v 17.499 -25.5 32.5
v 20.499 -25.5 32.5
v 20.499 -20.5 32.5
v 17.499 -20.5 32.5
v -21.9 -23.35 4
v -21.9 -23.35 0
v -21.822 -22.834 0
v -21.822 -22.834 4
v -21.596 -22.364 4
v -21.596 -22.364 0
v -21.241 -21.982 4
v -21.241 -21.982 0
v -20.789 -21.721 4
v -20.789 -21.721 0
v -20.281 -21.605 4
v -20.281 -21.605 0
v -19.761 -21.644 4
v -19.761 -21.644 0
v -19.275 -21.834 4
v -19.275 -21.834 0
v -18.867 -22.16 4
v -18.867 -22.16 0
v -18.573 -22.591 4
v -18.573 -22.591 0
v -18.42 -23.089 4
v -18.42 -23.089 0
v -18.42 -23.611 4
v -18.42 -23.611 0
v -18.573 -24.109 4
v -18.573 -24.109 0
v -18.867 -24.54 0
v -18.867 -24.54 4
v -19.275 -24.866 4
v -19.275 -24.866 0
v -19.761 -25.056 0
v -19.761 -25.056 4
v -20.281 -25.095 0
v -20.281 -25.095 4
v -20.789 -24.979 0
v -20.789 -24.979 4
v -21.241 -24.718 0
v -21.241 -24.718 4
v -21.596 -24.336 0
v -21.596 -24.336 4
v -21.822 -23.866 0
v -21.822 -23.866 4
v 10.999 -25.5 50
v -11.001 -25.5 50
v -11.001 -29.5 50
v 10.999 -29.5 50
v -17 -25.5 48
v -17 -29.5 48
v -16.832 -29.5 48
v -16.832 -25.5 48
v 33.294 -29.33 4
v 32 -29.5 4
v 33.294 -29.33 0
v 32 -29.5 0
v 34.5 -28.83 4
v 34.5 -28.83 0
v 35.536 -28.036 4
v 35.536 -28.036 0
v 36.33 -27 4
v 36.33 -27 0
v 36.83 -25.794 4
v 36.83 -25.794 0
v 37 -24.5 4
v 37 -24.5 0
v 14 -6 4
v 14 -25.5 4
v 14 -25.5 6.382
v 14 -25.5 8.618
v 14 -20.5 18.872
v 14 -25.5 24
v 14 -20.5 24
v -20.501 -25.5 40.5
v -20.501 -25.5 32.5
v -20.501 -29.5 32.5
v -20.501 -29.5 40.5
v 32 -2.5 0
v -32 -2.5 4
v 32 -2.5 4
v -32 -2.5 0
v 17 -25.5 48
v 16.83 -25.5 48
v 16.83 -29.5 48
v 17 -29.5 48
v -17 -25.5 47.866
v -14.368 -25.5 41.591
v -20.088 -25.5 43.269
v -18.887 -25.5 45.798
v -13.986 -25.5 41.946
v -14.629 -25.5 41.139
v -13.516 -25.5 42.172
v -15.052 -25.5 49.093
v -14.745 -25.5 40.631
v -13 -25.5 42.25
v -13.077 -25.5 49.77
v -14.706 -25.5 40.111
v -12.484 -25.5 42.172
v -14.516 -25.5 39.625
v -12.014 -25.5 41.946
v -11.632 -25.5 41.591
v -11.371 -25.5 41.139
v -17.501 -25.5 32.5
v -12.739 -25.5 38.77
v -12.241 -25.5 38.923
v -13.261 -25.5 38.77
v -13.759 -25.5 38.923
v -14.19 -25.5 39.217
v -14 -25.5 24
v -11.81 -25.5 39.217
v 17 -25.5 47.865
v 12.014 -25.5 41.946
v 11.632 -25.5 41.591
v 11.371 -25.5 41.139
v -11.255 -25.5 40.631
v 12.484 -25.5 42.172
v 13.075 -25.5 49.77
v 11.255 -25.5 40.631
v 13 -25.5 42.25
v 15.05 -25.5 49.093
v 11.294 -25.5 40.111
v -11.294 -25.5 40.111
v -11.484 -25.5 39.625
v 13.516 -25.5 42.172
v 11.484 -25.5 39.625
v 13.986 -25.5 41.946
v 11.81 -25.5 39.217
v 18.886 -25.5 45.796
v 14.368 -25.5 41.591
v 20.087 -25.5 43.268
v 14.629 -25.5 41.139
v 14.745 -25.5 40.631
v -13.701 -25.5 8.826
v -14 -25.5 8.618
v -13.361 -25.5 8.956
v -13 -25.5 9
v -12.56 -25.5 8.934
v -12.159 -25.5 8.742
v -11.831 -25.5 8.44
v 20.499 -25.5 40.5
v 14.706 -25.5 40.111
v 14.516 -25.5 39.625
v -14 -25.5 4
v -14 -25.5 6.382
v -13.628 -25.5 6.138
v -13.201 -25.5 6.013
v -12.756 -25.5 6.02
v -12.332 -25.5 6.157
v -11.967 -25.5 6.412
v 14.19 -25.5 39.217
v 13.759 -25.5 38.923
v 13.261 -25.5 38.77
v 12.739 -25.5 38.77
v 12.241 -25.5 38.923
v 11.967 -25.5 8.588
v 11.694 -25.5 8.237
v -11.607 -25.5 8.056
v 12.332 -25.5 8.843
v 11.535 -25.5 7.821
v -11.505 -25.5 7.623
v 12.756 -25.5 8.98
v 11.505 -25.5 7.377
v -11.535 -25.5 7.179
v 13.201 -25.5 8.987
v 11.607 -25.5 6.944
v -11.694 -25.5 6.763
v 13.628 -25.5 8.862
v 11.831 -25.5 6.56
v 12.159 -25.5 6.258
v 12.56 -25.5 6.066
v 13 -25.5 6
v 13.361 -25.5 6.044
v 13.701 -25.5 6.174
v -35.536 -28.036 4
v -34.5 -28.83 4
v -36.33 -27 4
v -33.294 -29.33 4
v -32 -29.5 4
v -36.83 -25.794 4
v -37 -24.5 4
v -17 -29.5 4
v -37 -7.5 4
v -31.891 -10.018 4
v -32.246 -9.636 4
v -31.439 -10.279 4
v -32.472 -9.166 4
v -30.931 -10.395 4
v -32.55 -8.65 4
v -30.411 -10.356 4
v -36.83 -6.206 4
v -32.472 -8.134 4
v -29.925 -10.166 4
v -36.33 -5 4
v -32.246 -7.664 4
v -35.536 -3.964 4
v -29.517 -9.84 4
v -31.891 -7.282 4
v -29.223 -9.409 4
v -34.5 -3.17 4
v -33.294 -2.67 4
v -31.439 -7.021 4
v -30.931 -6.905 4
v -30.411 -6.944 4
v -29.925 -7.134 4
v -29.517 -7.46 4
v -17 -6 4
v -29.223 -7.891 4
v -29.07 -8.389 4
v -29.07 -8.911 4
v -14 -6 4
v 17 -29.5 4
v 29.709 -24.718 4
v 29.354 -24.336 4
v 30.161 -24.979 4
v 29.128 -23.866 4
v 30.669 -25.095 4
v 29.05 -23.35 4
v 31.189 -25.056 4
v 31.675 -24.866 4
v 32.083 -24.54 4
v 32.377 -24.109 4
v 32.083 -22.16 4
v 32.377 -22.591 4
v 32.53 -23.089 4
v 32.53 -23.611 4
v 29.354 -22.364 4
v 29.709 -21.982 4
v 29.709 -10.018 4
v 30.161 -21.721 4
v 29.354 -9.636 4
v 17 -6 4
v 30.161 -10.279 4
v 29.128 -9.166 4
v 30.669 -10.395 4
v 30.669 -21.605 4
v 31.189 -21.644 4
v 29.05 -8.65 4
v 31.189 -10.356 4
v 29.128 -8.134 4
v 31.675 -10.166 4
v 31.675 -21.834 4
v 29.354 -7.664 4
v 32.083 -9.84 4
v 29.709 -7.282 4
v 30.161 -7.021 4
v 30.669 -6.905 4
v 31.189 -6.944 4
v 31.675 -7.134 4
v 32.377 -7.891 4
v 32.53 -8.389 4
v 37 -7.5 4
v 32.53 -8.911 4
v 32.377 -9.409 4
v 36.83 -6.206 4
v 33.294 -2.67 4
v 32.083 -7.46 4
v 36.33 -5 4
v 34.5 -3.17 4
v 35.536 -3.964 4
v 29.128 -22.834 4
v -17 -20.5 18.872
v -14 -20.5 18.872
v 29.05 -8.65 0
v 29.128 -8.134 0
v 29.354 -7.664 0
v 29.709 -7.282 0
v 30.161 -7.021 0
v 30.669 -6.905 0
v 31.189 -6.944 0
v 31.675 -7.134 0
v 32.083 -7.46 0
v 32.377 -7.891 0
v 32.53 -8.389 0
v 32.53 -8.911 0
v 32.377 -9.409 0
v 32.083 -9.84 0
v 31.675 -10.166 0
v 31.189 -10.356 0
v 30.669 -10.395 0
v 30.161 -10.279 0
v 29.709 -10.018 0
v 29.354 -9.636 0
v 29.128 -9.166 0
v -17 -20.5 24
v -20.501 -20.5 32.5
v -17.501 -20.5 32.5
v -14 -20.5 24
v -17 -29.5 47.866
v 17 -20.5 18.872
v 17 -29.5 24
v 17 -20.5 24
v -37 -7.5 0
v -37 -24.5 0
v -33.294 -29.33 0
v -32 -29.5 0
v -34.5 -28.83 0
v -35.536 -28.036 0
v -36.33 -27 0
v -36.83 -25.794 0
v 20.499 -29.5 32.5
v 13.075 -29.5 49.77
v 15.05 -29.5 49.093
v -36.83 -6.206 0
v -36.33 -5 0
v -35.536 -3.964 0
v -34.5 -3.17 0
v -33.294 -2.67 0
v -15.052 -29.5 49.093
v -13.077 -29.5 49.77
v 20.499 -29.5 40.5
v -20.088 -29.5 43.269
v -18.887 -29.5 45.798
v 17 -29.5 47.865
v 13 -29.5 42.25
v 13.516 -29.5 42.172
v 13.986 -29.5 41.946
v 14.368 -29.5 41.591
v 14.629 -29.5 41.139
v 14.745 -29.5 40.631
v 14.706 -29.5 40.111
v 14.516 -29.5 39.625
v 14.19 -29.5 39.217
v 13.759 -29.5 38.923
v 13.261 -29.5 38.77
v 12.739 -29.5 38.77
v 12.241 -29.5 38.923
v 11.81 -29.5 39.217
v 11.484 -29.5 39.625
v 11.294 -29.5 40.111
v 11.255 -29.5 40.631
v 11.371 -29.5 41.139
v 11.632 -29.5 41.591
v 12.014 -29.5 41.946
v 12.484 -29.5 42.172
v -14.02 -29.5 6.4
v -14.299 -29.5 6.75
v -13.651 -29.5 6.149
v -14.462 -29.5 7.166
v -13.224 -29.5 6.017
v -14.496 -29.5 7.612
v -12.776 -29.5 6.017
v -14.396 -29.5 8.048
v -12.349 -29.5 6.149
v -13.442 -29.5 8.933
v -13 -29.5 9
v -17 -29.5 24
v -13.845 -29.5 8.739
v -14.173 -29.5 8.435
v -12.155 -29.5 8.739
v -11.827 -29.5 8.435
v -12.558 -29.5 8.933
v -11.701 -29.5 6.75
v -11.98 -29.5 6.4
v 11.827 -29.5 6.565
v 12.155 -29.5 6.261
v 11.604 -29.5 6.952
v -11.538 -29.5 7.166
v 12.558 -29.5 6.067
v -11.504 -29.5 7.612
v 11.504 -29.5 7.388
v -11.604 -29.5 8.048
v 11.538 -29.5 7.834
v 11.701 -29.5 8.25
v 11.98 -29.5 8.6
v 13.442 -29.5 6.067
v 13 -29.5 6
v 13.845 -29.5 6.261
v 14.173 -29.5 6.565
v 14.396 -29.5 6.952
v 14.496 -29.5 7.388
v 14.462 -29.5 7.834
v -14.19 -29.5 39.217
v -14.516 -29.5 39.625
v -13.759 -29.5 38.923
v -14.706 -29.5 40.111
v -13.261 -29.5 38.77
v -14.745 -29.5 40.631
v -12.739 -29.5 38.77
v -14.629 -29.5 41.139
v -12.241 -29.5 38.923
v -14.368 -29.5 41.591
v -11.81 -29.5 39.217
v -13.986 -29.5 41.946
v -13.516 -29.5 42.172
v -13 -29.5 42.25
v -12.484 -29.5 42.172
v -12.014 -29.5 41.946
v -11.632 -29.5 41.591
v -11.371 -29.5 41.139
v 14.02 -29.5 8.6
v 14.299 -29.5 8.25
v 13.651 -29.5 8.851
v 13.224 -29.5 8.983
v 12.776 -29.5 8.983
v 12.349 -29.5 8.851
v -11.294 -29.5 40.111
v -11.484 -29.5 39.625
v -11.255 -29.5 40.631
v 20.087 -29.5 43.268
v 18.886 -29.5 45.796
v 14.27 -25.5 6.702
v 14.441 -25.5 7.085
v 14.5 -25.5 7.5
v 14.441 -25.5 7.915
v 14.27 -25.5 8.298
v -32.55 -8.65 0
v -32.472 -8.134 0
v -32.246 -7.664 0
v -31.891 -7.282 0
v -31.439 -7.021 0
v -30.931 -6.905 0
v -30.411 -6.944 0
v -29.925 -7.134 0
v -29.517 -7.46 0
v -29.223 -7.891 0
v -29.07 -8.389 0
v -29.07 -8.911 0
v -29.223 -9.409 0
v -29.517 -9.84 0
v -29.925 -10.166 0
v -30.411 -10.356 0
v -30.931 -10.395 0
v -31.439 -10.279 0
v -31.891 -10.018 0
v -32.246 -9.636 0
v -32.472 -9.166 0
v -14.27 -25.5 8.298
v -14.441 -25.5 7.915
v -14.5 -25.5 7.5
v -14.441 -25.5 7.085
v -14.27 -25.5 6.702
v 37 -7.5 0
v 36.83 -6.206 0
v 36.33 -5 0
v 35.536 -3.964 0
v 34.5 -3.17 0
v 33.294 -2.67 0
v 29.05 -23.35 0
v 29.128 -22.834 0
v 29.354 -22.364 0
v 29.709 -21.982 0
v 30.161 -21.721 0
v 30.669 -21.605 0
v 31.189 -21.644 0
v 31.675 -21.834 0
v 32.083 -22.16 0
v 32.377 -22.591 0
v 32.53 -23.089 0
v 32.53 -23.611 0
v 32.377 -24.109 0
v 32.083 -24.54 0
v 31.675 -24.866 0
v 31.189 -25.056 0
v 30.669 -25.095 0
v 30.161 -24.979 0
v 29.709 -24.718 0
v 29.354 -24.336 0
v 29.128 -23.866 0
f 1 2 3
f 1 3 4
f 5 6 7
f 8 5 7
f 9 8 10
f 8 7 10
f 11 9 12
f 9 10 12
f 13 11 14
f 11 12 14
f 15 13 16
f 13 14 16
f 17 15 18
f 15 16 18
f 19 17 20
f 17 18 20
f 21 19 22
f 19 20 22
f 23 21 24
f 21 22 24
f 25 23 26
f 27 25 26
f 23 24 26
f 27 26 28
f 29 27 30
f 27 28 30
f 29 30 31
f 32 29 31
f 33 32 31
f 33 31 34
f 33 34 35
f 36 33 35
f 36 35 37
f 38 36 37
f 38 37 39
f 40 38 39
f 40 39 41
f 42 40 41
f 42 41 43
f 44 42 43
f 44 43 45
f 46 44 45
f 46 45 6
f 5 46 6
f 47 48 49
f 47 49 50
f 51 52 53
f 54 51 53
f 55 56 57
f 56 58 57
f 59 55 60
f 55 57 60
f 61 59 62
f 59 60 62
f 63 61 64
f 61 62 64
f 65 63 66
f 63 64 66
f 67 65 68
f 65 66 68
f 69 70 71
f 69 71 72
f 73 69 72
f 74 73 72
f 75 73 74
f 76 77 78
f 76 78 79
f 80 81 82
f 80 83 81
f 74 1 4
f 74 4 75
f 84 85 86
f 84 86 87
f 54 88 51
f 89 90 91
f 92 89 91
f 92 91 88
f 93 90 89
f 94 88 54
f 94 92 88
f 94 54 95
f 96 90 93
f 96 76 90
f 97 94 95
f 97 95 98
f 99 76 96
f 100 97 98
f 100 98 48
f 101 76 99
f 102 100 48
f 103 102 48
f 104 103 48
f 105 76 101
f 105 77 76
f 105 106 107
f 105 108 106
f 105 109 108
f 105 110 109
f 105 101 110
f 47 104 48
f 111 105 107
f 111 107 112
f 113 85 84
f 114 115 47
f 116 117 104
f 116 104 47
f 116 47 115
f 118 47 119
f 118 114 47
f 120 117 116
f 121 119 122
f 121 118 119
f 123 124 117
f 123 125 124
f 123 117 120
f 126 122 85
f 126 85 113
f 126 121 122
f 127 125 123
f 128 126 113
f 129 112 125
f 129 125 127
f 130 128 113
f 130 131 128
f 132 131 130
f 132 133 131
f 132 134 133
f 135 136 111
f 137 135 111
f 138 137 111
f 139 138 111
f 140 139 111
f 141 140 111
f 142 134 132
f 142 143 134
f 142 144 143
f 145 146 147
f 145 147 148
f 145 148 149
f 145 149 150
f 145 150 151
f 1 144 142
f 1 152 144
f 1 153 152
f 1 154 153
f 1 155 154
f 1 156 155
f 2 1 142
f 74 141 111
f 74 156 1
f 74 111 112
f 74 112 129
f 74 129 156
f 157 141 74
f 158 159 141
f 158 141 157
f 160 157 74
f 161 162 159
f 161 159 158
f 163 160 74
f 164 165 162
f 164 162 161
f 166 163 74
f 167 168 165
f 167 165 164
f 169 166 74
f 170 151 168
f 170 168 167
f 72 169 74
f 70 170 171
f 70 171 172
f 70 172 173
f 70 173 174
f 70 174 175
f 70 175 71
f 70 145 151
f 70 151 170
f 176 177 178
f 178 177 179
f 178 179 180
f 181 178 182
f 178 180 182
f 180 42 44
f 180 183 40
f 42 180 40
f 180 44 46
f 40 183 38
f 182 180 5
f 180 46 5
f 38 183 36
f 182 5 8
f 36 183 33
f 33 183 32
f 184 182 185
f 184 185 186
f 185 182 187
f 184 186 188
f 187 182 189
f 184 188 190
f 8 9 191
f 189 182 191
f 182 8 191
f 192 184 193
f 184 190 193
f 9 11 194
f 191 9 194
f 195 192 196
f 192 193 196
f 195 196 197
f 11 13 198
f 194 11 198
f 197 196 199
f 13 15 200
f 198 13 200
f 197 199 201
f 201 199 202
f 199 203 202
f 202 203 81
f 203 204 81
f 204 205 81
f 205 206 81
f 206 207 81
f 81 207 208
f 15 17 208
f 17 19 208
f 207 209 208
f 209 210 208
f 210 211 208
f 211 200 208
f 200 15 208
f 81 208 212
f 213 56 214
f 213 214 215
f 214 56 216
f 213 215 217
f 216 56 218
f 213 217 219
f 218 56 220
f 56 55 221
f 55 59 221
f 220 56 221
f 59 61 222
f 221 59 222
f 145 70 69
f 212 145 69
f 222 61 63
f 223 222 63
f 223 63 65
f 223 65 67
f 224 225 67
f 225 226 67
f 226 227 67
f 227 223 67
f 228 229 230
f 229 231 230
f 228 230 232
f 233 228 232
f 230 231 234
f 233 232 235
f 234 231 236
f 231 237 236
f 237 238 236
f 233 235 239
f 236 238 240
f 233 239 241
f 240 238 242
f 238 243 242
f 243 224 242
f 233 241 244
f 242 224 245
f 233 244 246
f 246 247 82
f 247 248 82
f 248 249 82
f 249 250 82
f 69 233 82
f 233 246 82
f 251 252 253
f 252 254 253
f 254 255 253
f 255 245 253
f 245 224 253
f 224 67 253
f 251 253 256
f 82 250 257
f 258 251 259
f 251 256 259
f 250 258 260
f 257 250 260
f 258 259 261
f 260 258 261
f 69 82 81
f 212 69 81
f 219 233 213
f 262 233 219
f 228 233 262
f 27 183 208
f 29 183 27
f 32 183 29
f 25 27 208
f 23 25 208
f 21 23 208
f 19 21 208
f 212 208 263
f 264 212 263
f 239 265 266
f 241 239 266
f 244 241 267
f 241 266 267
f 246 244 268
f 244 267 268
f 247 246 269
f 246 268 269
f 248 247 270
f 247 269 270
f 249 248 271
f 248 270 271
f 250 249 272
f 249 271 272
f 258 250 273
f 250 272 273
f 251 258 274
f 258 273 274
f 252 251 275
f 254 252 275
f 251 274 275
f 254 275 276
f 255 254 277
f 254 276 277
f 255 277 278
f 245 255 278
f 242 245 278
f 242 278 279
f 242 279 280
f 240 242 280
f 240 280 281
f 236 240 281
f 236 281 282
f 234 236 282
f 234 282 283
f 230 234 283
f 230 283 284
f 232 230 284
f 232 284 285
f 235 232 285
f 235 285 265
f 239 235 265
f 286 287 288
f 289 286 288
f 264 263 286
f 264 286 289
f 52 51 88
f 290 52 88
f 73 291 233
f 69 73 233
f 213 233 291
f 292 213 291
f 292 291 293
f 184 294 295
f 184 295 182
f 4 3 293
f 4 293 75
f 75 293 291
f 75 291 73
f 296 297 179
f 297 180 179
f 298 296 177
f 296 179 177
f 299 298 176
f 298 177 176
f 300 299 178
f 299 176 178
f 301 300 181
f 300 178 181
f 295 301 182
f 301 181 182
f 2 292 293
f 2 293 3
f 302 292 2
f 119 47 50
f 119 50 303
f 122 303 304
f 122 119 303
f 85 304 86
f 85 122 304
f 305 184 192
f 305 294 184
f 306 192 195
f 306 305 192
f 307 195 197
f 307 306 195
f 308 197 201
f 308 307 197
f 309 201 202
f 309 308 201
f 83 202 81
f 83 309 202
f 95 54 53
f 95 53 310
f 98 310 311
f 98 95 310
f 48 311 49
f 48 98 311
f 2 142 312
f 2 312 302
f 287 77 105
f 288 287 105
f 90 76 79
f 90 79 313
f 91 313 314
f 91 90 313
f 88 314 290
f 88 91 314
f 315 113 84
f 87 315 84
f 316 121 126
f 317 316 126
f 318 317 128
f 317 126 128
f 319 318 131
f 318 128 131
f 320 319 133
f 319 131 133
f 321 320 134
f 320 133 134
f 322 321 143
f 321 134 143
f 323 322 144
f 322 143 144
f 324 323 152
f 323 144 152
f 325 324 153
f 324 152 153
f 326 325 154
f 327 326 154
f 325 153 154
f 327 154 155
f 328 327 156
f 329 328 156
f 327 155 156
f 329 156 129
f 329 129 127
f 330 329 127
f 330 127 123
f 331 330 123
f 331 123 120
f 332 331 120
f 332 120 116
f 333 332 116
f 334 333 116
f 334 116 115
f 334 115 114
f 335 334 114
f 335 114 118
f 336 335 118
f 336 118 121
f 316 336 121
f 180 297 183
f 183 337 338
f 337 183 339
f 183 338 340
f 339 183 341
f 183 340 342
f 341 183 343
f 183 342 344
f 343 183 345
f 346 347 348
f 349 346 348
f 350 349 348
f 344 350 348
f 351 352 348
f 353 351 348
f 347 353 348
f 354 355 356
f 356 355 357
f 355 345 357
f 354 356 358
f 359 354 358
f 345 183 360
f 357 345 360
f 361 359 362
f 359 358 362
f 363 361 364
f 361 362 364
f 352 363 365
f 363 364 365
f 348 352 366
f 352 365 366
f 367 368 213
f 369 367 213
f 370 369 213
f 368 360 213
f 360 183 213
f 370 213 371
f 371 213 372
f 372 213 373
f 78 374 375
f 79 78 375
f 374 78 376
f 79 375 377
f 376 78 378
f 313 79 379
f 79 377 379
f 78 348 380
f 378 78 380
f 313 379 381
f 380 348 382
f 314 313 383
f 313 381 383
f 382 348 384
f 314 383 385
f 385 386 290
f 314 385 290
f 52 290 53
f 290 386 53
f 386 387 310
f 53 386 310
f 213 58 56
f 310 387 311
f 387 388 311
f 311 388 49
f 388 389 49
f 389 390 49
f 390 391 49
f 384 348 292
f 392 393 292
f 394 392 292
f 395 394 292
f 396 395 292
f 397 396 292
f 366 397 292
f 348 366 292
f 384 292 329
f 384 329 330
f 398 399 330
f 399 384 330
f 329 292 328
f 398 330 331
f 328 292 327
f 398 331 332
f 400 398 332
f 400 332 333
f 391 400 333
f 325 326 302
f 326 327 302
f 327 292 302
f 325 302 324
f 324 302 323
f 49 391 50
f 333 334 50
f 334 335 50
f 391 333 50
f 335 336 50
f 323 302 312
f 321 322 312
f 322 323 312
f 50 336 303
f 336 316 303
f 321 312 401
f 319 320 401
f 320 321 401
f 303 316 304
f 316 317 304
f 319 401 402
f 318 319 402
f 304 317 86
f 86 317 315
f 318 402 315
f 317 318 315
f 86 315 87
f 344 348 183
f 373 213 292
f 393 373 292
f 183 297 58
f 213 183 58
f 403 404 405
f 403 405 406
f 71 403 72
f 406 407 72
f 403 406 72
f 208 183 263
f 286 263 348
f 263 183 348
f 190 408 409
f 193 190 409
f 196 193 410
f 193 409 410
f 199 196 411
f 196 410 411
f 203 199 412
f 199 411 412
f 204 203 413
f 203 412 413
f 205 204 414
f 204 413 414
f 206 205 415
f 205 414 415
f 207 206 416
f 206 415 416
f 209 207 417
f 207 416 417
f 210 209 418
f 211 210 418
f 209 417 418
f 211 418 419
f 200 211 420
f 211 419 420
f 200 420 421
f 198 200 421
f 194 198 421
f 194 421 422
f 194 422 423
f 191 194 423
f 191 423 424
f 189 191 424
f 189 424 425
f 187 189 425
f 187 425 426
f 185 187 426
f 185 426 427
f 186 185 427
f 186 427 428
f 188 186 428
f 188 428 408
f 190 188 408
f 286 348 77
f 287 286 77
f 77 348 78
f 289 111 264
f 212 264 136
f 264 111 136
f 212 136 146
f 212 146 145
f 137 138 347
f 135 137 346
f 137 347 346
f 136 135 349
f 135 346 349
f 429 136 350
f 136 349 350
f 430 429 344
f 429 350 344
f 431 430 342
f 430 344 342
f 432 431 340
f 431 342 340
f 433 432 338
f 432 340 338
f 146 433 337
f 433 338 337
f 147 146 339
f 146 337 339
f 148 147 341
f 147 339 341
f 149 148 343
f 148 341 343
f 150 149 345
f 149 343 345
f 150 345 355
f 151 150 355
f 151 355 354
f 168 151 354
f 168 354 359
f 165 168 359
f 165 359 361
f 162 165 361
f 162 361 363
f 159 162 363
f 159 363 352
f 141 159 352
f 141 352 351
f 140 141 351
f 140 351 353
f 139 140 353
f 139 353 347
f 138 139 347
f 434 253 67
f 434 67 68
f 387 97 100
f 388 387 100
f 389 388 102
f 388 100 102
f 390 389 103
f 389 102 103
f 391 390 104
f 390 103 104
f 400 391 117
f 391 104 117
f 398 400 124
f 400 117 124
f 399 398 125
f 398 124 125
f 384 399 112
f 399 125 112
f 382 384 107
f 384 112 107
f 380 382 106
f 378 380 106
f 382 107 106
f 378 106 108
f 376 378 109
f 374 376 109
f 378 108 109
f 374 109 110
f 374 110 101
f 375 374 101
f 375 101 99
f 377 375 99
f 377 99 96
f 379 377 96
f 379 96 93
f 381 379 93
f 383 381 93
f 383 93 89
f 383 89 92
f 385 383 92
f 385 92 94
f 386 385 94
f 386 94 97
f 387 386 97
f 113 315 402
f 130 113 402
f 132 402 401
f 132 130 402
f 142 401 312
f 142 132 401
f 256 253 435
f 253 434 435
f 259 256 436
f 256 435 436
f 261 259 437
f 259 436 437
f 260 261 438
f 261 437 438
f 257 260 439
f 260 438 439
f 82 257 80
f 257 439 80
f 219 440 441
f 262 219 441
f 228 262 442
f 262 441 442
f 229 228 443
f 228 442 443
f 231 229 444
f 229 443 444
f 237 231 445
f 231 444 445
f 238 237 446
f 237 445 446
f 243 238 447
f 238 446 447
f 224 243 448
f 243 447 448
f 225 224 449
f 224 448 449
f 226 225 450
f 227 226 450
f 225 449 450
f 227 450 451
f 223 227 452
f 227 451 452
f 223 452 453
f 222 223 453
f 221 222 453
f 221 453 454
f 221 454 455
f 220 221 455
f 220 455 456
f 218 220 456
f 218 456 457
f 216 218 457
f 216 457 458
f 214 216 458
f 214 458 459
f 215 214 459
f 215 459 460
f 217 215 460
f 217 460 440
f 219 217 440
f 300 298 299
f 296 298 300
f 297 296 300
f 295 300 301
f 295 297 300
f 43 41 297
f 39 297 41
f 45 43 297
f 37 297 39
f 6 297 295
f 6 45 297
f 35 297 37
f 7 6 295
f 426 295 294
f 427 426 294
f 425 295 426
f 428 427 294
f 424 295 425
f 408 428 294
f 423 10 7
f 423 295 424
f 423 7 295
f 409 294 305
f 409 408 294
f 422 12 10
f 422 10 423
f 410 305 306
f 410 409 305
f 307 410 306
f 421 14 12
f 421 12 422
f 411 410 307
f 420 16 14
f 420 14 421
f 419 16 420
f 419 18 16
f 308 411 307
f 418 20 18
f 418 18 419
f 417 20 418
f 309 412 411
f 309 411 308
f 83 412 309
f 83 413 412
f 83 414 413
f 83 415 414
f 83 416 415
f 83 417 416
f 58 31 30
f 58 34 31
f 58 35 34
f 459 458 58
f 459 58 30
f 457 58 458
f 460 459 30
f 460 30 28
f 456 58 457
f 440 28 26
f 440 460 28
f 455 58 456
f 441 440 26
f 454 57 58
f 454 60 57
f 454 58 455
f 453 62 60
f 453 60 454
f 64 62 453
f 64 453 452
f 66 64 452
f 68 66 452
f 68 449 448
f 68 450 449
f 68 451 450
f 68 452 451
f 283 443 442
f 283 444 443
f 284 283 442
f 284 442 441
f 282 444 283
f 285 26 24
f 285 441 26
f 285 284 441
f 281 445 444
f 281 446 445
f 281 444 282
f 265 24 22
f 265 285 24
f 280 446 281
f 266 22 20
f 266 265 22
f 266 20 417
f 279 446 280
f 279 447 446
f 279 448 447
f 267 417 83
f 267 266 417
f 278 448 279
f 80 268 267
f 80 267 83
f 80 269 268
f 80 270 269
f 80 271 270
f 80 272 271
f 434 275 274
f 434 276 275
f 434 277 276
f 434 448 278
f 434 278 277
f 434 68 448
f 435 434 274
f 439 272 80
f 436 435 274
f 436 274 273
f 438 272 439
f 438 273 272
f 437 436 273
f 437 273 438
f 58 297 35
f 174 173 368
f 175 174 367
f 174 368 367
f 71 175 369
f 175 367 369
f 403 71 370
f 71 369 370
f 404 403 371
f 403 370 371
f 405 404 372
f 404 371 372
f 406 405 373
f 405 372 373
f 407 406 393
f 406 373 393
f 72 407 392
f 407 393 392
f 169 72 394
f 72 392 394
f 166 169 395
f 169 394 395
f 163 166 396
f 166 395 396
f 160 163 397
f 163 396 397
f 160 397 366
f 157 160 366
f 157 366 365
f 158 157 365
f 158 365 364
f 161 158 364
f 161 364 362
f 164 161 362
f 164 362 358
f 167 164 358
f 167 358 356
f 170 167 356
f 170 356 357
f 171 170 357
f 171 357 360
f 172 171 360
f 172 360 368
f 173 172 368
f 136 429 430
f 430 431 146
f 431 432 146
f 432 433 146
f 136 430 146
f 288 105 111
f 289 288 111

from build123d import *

# Parameters (mm, degrees)
SKETCH_1_W          = 34
SKETCH_1_H          = 51
EXTRUDE_1_DEPTH     = 4
SKETCH_5_W          = 34
SKETCH_5_H          = 15
EXTRUDE_2_DEPTH     = 4
SKETCH_6_R          = 1.5
CUT_EXTRUDE_3_DEPTH = 4
SKETCH_12_W         = 34
SKETCH_12_H         = 4
CUT_EXTRUDE_5_DEPTH = 5
SKETCH_13_W         = 34
SKETCH_13_H         = 4
CUT_EXTRUDE_6_DEPTH = 7
SKETCH_14_W         = 34
SKETCH_14_H         = 4
EXTRUDE_3_DEPTH     = 33
SKETCH_15_R         = 1.75
CUT_EXTRUDE_7_DEPTH = 44
EXTRUDE_4_DEPTH     = 3
EXTRUDE_5_DEPTH     = 3
SKETCH_18_R         = 1.75
EXTRUDE_6_DEPTH     = 4
EXTRUDE_7_DEPTH     = 5
SKETCH_20_W         = 4
SKETCH_20_H         = 43
EXTRUDE_8_DEPTH     = 20
SKETCH_21_W         = 4
SKETCH_21_H         = 43
EXTRUDE_9_DEPTH     = 20
SKETCH_22_W         = 74
SKETCH_22_H         = 4
CUT_EXTRUDE_8_DEPTH = 16
SKETCH_23_R         = 1.75
CUT_EXTRUDE_9_DEPTH = 16
FILLET_1_R          = 5


with BuildPart() as part:
    # 草图1 → 凸台-拉伸1 (new body)
    with BuildSketch(Plane.XY):
        Rectangle(SKETCH_1_W, SKETCH_1_H)
    extrude(amount=EXTRUDE_1_DEPTH)

    # 草图5 → 凸台-拉伸2 (add)
    with BuildSketch(Plane.XZ.offset(25.5)):
        with Locations((0, 7.5)):
            Rectangle(SKETCH_5_W, SKETCH_5_H)
    extrude(amount=EXTRUDE_2_DEPTH)

    # 草图6 → 切除-拉伸3 (cut)
    with BuildSketch(Plane.XZ.offset(29.5)):
        with Locations(Location((13, 7.5, 0), (0, 0, 270))):
            Circle(SKETCH_6_R)
        with Locations(Location((-13, 7.5, 0), (0, 0, 90))):
            Circle(SKETCH_6_R)
    extrude(amount=-CUT_EXTRUDE_3_DEPTH, mode=Mode.SUBTRACT)

    # 草图12 → 切除-拉伸5 (cut)
    with BuildSketch(Plane(origin=(0, 25.5, 0), x_dir=(1, 0, 0), z_dir=(0, 1, 0))):
        with Locations((0, -2)):
            Rectangle(SKETCH_12_W, SKETCH_12_H)
    extrude(amount=-CUT_EXTRUDE_5_DEPTH, mode=Mode.SUBTRACT)

    # 草图13 → 切除-拉伸6 (cut)
    with BuildSketch(Plane(origin=(0, 20.5, 0), x_dir=(1, 0, 0), z_dir=(0, 1, 0))):
        with Locations((0, -2)):
            Rectangle(SKETCH_13_W, SKETCH_13_H)
    extrude(amount=-CUT_EXTRUDE_6_DEPTH, mode=Mode.SUBTRACT)

    # 草图14 → 凸台-拉伸3 (add)
    with BuildSketch(Plane.XY.offset(15)):
        with Locations((0, -27.5)):
            Rectangle(SKETCH_14_W, SKETCH_14_H)
    extrude(amount=EXTRUDE_3_DEPTH)

    # 草图15 → 切除-拉伸7 (cut)
    with BuildSketch(Plane(origin=(0, -25.5, 0), x_dir=(1, 0, 0), z_dir=(0, 1, 0))):
        with Locations(Location((13, -40.5, 0), (0, 0, 270))):
            Circle(SKETCH_15_R)
        with Locations(Location((-13, -40.5, 0), (0, 0, 270))):
            Circle(SKETCH_15_R)
    extrude(amount=-CUT_EXTRUDE_7_DEPTH, mode=Mode.SUBTRACT)

    # 草图16 → 凸台-拉伸4 (add)
    with BuildSketch(Plane.ZY.offset(17)):
        Polygon((4, -25.5), (4, -6), (24, -25.5), align=None)
    extrude(amount=-EXTRUDE_4_DEPTH)

    # 草图17 → 凸台-拉伸5 (add)
    with BuildSketch(Plane(origin=(17, 0, 0), x_dir=(0, 0, -1), z_dir=(1, 0, 0))):
        Polygon((-24, -25.5), (-4, -6), (-4, -25.5), align=None)
    extrude(amount=-EXTRUDE_5_DEPTH)

    # 草图18 → 凸台-拉伸6 (add)
    with BuildSketch(Plane(origin=(0, -25.5, 0), x_dir=(1, 0, 0), z_dir=(0, 1, 0))):
        with BuildLine():
            Line((20.499000769, -32.499999751), (17, -24))
            Line((17, -24), (-17, -24))
            Line((-17, -24), (-20.500999231, -32.499999751))
            Line((-20.500999231, -32.499999751), (-20.500999231, -40.499999751))
            ThreePointArc((-20.500999231, -40.499999751), (-17.718513652, -47.217514172), (-11.000999231, -49.999999751))
            Line((-11.000999231, -49.999999751), (10.999000769, -49.999999751))
            ThreePointArc((10.999000769, -49.999999751), (17.71651519, -47.217514172), (20.499000769, -40.499999751))
            Line((20.499000769, -40.499999751), (20.499000769, -32.499999751))
        make_face()
        with Locations(Location((-13, -40.5, 0), (0, 0, 270))):
            Circle(SKETCH_18_R, mode=Mode.SUBTRACT)
        with Locations(Location((13, -40.5, 0), (0, 0, 270))):
            Circle(SKETCH_18_R, mode=Mode.SUBTRACT)
    extrude(amount=-EXTRUDE_6_DEPTH)

    # 草图19 → 凸台-拉伸7 (add)
    with BuildSketch(Plane(origin=(0, -25.5, 0), x_dir=(1, 0, 0), z_dir=(0, 1, 0))):
        Polygon((-20.500999231, -32.499999751), (-17.500999231, -32.499999751), (-14, -24), (-14, -16), (-17, -16), (-17, -24), align=None)
        Polygon((17, -24), (20.499000769, -32.499999751), (17.499000769, -32.499999751), (14, -24), (14, -16), (17, -16), align=None)
    extrude(amount=EXTRUDE_7_DEPTH)

    # 草图20 → 凸台-拉伸8 (add)
    with BuildSketch(Plane(origin=(17, 0, 0), x_dir=(0, 0, -1), z_dir=(1, 0, 0))):
        with Locations((-2, -8)):
            Rectangle(SKETCH_20_W, SKETCH_20_H)
    extrude(amount=EXTRUDE_8_DEPTH)

    # 草图21 → 凸台-拉伸9 (add)
    with BuildSketch(Plane.ZY.offset(17)):
        with Locations((2, -8)):
            Rectangle(SKETCH_21_W, SKETCH_21_H)
    extrude(amount=EXTRUDE_9_DEPTH)

    # 草图22 → 切除-拉伸8 (cut)
    with BuildSketch(Plane(origin=(0, 13.5, 0), x_dir=(1, 0, 0), z_dir=(0, 1, 0))):
        with Locations((0, -2)):
            Rectangle(SKETCH_22_W, SKETCH_22_H)
    extrude(amount=-CUT_EXTRUDE_8_DEPTH, mode=Mode.SUBTRACT)

    # 草图23 → 切除-拉伸9 (cut)
    with BuildSketch(Plane(origin=(0, 0, 0), x_dir=(-1, 0, 0), z_dir=(0, 0, -1))):
        with Locations((30.8, -8.65)):
            Circle(SKETCH_23_R)
        with Locations((-30.8, -8.65)):
            Circle(SKETCH_23_R)
        with Locations((-30.8, -23.35)):
            Circle(SKETCH_23_R)
        with Locations((20.15, -23.35)):
            Circle(SKETCH_23_R)
    extrude(amount=-CUT_EXTRUDE_9_DEPTH, mode=Mode.SUBTRACT)

    # 圆角1
    fillet_1_edges = [part.edges().sort_by_distance(p)[0] for p in [
        (37, -29.5, 2),
        (-37, -29.5, 2),
        (-37, -2.5, 2),
        (37, -2.5, 2),
    ]]
    fillet(fillet_1_edges, radius=FILLET_1_R)


solid = part.part
